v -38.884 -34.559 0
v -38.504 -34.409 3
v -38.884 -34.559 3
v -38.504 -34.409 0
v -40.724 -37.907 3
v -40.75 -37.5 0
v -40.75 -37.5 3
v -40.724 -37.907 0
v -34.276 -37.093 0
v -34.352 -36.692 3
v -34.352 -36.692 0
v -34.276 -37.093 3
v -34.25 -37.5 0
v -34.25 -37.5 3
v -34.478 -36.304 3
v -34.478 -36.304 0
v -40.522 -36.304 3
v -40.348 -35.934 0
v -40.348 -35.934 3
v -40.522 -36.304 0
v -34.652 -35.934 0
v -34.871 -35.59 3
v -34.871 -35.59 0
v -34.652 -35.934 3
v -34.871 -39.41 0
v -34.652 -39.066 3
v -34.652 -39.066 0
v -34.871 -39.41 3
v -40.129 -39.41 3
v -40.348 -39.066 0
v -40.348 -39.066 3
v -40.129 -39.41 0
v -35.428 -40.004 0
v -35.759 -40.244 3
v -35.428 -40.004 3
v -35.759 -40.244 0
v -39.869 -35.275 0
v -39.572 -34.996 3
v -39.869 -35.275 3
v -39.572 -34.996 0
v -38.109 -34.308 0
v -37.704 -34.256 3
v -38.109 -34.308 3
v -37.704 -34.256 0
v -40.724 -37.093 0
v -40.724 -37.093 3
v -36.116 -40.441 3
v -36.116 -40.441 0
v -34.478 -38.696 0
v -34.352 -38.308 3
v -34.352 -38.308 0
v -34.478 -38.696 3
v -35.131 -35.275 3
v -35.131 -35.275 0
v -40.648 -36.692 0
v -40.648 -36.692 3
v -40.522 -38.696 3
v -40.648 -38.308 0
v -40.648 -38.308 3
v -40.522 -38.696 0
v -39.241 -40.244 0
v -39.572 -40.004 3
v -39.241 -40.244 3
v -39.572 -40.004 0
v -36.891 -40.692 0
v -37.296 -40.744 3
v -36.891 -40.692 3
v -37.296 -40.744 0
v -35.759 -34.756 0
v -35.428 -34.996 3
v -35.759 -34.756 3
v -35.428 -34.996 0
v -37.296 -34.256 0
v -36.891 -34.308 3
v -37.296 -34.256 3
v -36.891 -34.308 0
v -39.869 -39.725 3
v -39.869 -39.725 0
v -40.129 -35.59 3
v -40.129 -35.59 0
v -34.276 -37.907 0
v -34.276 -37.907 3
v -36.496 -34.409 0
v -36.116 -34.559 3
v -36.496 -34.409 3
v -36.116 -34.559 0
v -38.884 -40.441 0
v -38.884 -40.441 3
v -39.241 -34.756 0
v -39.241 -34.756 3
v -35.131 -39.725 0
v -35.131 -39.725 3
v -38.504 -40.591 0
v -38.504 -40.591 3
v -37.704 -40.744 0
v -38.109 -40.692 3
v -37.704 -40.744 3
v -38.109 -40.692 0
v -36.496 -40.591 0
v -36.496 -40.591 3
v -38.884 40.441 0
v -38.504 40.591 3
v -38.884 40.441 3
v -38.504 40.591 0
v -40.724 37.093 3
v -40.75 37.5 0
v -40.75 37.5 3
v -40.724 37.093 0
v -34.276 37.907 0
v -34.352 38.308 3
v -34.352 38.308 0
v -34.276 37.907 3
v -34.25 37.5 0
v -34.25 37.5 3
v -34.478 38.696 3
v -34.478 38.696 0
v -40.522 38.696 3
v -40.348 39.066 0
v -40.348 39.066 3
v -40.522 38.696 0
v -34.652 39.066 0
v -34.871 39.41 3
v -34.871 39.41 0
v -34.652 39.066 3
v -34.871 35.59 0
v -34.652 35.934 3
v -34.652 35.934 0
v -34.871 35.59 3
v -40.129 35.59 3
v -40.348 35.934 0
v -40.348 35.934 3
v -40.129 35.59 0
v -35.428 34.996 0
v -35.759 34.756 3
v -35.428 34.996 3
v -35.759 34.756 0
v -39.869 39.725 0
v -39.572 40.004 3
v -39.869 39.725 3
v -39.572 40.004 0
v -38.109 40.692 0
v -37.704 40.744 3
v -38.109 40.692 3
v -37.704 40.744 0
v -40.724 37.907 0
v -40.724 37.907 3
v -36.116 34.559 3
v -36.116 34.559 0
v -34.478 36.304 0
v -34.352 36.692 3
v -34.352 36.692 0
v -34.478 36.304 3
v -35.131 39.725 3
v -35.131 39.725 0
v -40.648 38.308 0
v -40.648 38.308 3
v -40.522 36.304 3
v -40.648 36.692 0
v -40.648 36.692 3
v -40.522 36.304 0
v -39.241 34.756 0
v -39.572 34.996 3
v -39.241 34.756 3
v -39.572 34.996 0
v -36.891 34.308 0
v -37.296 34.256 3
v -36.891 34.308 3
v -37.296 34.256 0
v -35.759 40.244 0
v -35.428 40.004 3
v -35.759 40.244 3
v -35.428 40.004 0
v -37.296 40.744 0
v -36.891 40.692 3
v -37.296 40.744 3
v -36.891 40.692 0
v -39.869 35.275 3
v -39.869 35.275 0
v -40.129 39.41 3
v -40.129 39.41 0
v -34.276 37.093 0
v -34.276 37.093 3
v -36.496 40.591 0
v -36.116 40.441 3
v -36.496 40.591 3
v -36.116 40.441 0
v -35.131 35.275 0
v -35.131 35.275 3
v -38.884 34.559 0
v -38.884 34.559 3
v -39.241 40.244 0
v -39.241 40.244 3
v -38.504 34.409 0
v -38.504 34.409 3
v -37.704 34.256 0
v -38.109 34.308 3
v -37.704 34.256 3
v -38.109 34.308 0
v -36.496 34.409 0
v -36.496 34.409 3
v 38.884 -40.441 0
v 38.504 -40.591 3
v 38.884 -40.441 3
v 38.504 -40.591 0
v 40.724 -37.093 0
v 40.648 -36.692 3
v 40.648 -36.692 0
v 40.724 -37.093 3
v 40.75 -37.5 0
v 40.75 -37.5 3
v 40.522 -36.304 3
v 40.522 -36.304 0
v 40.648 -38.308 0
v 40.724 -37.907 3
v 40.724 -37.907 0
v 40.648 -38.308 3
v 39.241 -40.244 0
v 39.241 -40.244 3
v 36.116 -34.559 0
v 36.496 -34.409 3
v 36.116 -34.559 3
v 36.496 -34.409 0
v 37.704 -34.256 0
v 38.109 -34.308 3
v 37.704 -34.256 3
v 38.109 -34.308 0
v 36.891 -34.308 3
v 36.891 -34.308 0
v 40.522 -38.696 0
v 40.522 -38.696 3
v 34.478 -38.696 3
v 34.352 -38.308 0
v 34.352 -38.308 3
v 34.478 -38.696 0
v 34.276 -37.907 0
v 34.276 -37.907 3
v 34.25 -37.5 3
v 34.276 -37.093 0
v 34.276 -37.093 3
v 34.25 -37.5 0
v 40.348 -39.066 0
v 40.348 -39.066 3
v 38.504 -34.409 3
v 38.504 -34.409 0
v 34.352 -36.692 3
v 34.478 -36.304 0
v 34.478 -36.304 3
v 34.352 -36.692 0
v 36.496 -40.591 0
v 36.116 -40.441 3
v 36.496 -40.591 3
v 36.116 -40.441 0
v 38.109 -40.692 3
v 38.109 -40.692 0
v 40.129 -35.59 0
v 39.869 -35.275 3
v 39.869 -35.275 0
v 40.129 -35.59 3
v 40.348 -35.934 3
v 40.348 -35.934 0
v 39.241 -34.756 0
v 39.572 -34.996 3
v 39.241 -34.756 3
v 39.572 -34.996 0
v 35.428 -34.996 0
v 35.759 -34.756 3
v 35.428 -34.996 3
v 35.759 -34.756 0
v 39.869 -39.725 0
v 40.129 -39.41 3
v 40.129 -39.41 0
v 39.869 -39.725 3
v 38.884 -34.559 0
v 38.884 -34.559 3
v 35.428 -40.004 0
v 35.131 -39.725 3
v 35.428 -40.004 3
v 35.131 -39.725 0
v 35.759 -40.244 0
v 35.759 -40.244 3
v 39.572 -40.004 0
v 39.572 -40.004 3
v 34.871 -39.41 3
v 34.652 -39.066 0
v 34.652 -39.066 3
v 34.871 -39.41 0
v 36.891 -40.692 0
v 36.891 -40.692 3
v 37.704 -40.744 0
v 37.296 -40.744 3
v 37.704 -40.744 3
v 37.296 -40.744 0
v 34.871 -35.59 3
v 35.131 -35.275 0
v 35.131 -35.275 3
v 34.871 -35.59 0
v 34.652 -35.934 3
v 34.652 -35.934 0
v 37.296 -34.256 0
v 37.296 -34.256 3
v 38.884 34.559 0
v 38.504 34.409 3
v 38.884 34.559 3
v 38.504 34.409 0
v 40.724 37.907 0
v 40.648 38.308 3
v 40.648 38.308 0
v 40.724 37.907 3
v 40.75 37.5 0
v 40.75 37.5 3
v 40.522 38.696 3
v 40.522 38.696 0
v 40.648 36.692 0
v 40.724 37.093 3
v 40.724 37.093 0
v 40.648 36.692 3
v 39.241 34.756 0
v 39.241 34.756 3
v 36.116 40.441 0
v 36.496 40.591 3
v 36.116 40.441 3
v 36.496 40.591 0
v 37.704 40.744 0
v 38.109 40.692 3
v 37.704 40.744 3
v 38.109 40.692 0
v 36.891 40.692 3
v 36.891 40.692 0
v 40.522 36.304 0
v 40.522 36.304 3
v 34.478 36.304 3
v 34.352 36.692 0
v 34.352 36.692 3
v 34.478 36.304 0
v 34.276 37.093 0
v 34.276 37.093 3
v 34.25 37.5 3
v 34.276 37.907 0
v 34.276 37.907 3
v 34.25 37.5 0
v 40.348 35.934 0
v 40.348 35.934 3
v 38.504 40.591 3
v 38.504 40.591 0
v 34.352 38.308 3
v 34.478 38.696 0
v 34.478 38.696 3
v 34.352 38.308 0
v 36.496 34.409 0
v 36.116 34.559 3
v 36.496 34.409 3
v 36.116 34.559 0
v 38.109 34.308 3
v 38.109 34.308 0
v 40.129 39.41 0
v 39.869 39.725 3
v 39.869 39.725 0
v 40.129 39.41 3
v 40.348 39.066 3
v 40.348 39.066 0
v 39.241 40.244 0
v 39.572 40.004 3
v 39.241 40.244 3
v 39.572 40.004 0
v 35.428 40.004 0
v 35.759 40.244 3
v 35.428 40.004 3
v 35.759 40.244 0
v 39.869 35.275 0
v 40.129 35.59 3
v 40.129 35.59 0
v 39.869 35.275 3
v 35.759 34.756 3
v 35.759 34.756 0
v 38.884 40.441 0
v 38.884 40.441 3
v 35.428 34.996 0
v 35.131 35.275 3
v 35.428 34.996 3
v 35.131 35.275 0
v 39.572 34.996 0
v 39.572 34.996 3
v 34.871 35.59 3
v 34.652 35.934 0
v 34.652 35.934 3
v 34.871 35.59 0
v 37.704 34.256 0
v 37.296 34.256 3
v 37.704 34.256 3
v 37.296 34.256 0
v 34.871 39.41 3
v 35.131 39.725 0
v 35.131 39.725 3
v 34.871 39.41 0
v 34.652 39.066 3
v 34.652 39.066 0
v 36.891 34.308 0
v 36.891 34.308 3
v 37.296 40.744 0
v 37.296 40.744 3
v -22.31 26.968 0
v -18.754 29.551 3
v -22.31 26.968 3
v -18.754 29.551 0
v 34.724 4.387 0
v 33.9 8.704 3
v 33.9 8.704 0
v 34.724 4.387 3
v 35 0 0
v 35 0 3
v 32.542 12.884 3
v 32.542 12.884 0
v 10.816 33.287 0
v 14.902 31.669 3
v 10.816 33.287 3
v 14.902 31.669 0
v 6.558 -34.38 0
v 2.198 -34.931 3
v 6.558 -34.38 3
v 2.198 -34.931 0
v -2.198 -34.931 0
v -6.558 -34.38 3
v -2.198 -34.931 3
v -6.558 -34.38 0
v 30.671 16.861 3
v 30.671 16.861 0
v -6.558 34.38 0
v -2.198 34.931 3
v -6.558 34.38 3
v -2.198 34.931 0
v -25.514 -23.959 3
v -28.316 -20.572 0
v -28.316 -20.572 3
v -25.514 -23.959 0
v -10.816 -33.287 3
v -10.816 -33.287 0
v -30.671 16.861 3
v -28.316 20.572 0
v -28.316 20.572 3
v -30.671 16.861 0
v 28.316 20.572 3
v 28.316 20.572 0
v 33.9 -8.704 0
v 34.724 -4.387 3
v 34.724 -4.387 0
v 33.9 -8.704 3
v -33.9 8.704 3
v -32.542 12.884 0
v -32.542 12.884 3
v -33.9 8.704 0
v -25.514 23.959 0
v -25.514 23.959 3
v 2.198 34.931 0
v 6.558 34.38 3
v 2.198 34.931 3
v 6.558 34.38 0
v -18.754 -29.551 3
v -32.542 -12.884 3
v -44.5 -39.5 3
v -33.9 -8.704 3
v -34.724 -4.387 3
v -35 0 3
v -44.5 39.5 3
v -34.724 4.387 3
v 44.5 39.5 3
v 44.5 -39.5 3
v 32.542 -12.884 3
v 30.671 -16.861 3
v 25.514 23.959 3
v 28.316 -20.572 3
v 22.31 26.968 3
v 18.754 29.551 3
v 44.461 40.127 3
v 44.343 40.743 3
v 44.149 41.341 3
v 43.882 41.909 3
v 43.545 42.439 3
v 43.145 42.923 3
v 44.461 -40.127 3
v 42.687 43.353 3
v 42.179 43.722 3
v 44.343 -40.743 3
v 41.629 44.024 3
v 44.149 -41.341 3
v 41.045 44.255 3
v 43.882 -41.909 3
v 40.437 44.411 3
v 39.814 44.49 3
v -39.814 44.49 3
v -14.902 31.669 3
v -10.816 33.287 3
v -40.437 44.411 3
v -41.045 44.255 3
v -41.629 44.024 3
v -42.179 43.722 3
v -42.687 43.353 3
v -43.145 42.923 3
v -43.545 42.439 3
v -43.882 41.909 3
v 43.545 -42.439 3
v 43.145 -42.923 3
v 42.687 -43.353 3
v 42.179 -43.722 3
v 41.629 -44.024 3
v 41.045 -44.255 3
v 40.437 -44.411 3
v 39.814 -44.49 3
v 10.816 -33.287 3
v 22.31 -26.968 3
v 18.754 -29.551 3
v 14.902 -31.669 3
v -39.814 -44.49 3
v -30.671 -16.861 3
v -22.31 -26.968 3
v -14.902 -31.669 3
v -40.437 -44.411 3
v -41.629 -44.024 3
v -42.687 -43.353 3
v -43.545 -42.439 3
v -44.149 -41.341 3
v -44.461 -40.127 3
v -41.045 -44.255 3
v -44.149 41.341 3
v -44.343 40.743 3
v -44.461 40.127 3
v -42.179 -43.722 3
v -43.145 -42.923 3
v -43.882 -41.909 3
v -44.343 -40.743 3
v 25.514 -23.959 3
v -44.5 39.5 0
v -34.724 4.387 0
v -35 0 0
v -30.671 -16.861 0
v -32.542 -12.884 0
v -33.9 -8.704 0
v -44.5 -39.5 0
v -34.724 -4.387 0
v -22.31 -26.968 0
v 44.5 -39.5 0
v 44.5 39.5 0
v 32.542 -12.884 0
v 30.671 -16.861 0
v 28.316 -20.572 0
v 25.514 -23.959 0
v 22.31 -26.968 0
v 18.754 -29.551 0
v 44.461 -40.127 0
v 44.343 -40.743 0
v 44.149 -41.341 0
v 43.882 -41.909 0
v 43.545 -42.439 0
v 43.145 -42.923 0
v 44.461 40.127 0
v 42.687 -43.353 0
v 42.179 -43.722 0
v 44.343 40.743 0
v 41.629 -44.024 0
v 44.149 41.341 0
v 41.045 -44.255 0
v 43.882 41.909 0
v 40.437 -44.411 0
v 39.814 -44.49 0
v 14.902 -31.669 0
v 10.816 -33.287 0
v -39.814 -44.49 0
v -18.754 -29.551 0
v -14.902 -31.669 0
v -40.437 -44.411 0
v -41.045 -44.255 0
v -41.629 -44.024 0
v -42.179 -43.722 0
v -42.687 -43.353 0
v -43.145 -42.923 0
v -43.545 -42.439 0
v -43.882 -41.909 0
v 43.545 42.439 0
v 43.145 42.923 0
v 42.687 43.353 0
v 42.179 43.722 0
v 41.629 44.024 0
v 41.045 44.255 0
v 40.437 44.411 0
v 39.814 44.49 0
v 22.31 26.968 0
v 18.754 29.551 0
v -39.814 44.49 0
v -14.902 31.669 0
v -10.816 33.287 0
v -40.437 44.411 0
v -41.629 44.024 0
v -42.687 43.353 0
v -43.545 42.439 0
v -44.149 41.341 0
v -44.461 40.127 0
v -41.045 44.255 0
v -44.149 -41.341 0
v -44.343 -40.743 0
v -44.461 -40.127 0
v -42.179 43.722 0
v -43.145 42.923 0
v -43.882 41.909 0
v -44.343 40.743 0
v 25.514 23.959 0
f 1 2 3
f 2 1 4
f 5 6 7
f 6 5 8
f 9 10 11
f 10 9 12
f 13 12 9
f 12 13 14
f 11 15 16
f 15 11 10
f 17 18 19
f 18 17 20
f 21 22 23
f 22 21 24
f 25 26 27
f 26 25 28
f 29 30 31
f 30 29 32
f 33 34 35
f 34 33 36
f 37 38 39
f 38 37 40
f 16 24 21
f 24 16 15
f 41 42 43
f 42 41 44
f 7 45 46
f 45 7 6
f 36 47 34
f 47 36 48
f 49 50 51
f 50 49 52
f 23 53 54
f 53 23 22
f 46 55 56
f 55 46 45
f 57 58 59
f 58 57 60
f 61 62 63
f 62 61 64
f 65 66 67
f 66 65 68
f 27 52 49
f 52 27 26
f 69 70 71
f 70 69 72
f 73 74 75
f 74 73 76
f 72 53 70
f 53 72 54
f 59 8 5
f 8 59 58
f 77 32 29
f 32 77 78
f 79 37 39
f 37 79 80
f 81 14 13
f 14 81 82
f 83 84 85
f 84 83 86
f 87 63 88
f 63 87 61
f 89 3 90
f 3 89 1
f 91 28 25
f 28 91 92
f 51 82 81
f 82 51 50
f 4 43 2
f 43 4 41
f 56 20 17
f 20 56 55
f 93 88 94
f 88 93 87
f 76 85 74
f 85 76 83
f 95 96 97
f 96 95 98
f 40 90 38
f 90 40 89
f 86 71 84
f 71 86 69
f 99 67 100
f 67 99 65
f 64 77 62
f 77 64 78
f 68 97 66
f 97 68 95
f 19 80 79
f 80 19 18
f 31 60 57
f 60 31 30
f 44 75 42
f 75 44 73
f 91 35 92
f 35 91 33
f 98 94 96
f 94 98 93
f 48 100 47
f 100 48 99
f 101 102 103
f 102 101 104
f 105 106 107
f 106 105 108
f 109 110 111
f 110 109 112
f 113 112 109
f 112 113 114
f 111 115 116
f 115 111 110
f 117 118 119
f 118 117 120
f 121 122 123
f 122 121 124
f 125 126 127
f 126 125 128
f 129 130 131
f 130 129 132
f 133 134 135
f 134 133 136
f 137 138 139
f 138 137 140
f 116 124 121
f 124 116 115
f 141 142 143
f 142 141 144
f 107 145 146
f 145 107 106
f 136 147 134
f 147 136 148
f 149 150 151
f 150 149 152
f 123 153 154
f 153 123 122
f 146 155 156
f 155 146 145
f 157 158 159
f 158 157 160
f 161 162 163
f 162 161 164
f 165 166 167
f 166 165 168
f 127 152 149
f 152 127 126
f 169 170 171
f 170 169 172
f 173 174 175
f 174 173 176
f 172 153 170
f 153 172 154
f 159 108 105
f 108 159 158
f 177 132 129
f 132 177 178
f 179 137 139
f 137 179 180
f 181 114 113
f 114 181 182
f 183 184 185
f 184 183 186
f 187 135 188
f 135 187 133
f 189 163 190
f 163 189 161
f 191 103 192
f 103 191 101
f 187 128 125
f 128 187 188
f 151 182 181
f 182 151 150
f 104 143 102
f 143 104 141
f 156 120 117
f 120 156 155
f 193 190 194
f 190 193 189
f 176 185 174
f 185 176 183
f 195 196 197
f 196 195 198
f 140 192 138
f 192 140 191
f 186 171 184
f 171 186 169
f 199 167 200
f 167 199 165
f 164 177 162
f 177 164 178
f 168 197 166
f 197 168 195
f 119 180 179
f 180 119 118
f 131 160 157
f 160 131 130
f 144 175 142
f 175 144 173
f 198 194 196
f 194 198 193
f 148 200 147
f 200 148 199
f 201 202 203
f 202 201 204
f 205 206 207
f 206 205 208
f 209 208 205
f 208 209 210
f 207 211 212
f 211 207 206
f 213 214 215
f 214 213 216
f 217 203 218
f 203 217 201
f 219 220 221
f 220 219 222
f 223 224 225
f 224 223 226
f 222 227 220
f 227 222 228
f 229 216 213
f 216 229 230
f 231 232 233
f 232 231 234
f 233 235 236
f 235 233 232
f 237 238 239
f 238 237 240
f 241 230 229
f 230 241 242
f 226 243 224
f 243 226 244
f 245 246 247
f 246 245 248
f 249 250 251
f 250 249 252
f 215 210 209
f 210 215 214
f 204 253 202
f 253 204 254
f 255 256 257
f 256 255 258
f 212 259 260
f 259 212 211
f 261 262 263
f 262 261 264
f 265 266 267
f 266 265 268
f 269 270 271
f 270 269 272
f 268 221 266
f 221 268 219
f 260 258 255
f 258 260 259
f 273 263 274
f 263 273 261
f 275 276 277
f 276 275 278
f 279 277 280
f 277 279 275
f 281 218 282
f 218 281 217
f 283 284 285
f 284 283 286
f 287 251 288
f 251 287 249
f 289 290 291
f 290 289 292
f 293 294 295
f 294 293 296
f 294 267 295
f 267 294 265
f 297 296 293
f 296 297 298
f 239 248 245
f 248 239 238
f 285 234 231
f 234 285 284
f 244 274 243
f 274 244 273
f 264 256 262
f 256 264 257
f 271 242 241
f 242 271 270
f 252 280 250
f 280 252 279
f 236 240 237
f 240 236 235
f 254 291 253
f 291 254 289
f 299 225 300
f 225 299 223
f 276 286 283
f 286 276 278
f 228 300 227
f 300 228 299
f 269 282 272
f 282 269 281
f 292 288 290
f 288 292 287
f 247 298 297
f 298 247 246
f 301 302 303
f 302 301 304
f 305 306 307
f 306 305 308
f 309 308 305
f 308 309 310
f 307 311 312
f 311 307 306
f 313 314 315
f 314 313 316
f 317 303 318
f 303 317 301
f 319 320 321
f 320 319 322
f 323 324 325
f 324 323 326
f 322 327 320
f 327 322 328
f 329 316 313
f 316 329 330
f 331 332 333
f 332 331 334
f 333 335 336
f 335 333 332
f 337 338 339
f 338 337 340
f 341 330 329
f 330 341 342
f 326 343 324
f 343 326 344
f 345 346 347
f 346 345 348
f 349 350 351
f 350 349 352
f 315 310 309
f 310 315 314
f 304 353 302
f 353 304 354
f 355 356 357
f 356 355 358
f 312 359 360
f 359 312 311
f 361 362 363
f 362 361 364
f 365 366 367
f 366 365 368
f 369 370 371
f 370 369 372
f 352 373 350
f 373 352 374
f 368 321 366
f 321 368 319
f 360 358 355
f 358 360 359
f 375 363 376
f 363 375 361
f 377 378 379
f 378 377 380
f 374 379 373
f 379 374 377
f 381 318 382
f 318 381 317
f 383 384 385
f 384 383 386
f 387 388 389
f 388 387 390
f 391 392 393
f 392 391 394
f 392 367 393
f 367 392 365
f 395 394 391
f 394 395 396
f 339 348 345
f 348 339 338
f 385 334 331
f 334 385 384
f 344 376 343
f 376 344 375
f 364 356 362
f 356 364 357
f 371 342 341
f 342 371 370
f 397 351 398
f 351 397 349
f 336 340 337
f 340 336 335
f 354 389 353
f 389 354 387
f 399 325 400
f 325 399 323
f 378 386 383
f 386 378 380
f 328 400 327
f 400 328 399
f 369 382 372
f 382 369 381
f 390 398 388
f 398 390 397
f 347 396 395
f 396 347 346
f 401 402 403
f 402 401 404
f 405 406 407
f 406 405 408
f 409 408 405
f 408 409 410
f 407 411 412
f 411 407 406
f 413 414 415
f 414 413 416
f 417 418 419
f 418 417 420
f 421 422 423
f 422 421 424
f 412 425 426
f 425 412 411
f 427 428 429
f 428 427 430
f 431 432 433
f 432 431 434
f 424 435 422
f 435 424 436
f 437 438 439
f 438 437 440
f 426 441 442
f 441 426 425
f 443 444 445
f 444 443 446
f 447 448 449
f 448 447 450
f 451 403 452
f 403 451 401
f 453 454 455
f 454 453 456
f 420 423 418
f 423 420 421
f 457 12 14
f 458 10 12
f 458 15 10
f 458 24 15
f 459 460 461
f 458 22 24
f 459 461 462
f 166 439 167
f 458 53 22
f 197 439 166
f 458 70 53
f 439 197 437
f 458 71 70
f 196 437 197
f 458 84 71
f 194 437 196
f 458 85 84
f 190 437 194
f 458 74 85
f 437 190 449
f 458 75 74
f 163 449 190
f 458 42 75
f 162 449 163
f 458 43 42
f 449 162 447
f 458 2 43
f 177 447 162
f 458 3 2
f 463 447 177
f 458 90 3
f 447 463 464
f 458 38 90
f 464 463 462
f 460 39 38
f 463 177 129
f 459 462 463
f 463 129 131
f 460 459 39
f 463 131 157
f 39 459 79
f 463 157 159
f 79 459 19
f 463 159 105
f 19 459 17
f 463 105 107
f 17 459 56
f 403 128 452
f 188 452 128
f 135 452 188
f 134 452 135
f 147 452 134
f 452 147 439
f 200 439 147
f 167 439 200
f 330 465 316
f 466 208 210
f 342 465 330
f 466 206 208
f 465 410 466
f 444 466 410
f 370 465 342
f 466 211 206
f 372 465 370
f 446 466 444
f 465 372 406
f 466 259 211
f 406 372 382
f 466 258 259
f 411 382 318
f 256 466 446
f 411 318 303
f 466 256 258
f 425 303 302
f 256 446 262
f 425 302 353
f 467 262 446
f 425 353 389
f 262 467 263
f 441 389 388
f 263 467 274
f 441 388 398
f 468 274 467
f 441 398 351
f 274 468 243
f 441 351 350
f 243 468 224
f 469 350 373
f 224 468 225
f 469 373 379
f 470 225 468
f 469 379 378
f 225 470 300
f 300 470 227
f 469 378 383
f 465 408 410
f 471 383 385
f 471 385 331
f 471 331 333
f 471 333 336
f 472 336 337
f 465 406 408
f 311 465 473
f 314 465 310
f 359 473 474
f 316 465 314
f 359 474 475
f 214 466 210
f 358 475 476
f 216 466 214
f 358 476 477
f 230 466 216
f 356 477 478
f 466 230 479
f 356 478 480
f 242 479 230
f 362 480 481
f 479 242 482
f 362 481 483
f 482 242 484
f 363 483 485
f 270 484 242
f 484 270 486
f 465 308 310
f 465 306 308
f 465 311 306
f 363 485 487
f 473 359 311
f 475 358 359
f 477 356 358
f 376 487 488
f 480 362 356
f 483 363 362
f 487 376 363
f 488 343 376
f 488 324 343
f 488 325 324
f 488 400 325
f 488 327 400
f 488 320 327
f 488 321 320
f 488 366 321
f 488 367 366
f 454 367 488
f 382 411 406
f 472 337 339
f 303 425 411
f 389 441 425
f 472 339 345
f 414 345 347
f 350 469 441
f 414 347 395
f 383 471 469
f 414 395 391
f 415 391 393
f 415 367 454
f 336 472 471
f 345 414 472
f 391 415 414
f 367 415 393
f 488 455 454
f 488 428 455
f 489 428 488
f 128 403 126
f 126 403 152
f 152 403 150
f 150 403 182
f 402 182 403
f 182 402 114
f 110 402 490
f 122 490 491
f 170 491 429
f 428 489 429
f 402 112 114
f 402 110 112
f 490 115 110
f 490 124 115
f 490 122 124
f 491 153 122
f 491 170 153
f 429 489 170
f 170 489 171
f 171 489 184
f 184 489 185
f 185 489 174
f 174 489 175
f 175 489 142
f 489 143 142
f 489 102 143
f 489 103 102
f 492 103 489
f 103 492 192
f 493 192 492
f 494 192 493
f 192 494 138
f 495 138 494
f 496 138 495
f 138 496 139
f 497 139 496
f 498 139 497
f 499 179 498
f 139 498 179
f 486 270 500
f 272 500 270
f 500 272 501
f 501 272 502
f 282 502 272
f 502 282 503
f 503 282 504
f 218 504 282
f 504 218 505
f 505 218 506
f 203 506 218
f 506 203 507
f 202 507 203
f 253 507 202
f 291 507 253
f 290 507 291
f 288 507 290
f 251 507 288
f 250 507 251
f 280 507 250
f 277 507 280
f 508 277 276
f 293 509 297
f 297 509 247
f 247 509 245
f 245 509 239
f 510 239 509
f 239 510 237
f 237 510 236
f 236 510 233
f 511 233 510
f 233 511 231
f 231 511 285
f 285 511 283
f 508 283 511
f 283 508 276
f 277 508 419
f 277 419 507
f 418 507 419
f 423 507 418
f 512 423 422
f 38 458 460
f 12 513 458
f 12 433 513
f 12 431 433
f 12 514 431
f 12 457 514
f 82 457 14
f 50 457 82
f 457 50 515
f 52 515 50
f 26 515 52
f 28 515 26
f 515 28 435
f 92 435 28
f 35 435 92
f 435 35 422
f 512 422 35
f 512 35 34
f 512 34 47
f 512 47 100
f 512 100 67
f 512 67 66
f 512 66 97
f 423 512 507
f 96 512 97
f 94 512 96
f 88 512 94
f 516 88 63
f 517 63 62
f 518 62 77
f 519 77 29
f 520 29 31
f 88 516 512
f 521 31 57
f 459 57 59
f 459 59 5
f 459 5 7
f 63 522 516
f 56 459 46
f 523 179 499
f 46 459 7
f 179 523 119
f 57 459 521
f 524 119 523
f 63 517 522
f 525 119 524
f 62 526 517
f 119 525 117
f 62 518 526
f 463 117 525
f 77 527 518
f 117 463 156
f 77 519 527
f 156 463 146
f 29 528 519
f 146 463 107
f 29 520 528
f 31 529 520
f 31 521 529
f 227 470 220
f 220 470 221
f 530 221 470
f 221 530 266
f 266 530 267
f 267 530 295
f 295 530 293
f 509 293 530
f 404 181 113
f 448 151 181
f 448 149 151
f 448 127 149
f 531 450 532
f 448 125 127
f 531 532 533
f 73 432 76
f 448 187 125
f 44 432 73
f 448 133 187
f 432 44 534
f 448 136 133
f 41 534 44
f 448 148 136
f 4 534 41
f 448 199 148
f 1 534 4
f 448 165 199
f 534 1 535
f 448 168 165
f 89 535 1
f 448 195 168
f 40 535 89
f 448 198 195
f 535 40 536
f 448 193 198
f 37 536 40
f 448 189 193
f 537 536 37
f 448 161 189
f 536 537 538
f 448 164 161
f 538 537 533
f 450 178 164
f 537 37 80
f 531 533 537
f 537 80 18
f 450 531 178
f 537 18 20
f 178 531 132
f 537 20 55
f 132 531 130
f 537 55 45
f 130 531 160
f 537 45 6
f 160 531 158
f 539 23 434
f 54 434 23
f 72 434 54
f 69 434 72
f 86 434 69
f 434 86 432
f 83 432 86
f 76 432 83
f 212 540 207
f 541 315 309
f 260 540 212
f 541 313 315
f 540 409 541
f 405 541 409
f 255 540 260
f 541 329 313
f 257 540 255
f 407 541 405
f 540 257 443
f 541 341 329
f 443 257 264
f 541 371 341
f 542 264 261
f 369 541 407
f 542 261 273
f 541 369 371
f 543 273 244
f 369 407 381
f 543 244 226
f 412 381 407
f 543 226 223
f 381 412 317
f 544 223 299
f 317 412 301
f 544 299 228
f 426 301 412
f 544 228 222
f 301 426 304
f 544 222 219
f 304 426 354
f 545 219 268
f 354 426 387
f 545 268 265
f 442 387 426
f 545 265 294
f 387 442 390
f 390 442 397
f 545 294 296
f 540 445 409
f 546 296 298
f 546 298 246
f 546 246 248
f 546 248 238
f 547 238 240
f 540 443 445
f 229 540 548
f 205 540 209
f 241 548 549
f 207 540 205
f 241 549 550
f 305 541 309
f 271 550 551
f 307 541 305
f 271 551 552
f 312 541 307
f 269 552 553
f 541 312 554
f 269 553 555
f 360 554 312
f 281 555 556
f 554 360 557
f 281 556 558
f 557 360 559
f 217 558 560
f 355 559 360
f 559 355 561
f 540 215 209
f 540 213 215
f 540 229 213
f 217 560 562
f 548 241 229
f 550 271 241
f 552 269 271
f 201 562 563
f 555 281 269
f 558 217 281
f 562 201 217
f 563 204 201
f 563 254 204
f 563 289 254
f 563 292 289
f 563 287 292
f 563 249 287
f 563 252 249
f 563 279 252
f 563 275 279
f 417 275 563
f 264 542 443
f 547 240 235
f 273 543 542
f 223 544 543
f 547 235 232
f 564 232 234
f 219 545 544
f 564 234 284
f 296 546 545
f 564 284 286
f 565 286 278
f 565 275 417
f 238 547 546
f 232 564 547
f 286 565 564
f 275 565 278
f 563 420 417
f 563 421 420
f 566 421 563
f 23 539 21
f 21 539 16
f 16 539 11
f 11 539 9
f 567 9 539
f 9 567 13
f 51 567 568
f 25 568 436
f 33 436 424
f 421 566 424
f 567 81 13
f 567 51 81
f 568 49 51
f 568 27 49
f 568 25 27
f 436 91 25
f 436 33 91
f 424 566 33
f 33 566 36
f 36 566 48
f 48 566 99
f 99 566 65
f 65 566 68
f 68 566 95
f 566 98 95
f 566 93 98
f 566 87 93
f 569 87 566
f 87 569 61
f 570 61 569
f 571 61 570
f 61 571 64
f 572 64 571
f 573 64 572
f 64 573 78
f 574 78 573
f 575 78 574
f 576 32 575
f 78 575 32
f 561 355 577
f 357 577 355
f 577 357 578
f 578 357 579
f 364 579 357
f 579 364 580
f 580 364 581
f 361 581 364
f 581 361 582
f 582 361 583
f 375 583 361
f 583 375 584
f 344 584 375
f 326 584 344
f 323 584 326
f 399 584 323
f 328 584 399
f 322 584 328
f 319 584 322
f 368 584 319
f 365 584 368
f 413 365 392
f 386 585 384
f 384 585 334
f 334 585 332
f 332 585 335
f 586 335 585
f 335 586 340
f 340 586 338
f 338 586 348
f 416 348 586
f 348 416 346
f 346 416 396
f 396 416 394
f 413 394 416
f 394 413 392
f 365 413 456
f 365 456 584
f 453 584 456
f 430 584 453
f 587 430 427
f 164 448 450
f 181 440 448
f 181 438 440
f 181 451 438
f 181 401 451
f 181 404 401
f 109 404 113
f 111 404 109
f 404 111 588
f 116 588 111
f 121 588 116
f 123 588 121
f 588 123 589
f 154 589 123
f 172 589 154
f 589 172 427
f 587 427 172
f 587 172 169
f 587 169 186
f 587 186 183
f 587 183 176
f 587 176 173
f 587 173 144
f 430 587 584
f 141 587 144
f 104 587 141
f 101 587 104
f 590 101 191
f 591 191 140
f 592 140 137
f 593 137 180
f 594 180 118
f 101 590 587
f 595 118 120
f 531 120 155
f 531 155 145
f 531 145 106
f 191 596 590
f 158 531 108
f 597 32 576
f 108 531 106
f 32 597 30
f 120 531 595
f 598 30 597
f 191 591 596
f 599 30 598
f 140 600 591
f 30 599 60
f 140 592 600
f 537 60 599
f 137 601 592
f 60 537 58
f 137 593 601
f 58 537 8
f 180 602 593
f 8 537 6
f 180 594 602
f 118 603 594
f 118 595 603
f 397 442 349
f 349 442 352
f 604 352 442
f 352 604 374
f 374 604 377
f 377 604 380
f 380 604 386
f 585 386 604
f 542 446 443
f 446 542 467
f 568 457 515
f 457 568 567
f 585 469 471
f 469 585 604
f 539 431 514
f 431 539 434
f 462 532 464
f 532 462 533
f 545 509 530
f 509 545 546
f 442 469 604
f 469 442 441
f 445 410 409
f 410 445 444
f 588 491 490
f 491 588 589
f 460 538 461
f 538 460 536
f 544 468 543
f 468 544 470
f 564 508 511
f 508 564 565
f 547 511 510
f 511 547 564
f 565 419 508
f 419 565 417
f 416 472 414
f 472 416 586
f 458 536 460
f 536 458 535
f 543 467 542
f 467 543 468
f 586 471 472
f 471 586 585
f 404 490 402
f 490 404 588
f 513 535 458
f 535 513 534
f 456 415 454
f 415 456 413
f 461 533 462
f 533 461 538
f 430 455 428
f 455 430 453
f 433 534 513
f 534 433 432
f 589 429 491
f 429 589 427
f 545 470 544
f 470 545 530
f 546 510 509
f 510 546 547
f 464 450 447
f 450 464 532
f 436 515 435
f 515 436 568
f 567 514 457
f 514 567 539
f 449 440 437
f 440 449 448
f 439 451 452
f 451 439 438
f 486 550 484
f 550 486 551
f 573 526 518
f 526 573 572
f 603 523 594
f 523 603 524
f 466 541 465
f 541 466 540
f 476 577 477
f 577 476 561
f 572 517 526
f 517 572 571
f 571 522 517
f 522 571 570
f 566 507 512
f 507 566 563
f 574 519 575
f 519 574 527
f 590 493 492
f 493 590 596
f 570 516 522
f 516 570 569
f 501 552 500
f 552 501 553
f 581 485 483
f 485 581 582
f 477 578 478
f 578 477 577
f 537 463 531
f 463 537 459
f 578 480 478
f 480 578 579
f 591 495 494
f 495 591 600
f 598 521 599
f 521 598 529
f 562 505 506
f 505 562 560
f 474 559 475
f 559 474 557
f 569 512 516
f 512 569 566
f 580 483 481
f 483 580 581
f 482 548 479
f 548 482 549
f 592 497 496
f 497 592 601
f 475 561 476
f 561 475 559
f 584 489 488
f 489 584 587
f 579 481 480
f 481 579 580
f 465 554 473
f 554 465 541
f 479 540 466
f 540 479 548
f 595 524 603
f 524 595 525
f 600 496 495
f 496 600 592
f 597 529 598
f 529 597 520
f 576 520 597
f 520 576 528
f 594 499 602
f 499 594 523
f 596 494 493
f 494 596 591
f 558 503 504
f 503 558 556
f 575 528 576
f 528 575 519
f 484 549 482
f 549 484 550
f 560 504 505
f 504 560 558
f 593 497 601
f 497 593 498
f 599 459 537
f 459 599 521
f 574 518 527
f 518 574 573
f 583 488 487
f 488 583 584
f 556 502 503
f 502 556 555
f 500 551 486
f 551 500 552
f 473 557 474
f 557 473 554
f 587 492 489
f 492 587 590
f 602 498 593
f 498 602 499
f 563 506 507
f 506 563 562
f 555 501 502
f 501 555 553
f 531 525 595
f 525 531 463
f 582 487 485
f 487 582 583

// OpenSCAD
$fn = 50;

difference() {
	union() {
		hull() {
			translate(v = [-39.5, 39.5, 0]) {
				cylinder(h = 3, r = 5);
			}
			translate(v = [39.5, 39.5, 0]) {
				cylinder(h = 3, r = 5);
			}
			translate(v = [-39.5, -39.5, 0]) {
				cylinder(h = 3, r = 5);
			}
			translate(v = [39.5, -39.5, 0]) {
				cylinder(h = 3, r = 5);
			}
		}
	}
	union() {
		translate(v = [-37.5, -37.5, -100.0]) {
			cylinder(h = 200, r = 3.25);
		}
		translate(v = [-37.5, 37.5, -100.0]) {
			cylinder(h = 200, r = 3.25);
		}
		translate(v = [37.5, -37.5, -100.0]) {
			cylinder(h = 200, r = 3.25);
		}
		translate(v = [37.5, 37.5, -100.0]) {
			cylinder(h = 200, r = 3.25);
		}
		translate(v = [-37.5, -37.5, -100.0]) {
			cylinder(h = 200, r = 1.8);
		}
		translate(v = [-37.5, 37.5, -100.0]) {
			cylinder(h = 200, r = 1.8);
		}
		translate(v = [37.5, -37.5, -100.0]) {
			cylinder(h = 200, r = 1.8);
		}
		translate(v = [37.5, 37.5, -100.0]) {
			cylinder(h = 200, r = 1.8);
		}
		cylinder(h = 3, r = 35.0);
	}
}
